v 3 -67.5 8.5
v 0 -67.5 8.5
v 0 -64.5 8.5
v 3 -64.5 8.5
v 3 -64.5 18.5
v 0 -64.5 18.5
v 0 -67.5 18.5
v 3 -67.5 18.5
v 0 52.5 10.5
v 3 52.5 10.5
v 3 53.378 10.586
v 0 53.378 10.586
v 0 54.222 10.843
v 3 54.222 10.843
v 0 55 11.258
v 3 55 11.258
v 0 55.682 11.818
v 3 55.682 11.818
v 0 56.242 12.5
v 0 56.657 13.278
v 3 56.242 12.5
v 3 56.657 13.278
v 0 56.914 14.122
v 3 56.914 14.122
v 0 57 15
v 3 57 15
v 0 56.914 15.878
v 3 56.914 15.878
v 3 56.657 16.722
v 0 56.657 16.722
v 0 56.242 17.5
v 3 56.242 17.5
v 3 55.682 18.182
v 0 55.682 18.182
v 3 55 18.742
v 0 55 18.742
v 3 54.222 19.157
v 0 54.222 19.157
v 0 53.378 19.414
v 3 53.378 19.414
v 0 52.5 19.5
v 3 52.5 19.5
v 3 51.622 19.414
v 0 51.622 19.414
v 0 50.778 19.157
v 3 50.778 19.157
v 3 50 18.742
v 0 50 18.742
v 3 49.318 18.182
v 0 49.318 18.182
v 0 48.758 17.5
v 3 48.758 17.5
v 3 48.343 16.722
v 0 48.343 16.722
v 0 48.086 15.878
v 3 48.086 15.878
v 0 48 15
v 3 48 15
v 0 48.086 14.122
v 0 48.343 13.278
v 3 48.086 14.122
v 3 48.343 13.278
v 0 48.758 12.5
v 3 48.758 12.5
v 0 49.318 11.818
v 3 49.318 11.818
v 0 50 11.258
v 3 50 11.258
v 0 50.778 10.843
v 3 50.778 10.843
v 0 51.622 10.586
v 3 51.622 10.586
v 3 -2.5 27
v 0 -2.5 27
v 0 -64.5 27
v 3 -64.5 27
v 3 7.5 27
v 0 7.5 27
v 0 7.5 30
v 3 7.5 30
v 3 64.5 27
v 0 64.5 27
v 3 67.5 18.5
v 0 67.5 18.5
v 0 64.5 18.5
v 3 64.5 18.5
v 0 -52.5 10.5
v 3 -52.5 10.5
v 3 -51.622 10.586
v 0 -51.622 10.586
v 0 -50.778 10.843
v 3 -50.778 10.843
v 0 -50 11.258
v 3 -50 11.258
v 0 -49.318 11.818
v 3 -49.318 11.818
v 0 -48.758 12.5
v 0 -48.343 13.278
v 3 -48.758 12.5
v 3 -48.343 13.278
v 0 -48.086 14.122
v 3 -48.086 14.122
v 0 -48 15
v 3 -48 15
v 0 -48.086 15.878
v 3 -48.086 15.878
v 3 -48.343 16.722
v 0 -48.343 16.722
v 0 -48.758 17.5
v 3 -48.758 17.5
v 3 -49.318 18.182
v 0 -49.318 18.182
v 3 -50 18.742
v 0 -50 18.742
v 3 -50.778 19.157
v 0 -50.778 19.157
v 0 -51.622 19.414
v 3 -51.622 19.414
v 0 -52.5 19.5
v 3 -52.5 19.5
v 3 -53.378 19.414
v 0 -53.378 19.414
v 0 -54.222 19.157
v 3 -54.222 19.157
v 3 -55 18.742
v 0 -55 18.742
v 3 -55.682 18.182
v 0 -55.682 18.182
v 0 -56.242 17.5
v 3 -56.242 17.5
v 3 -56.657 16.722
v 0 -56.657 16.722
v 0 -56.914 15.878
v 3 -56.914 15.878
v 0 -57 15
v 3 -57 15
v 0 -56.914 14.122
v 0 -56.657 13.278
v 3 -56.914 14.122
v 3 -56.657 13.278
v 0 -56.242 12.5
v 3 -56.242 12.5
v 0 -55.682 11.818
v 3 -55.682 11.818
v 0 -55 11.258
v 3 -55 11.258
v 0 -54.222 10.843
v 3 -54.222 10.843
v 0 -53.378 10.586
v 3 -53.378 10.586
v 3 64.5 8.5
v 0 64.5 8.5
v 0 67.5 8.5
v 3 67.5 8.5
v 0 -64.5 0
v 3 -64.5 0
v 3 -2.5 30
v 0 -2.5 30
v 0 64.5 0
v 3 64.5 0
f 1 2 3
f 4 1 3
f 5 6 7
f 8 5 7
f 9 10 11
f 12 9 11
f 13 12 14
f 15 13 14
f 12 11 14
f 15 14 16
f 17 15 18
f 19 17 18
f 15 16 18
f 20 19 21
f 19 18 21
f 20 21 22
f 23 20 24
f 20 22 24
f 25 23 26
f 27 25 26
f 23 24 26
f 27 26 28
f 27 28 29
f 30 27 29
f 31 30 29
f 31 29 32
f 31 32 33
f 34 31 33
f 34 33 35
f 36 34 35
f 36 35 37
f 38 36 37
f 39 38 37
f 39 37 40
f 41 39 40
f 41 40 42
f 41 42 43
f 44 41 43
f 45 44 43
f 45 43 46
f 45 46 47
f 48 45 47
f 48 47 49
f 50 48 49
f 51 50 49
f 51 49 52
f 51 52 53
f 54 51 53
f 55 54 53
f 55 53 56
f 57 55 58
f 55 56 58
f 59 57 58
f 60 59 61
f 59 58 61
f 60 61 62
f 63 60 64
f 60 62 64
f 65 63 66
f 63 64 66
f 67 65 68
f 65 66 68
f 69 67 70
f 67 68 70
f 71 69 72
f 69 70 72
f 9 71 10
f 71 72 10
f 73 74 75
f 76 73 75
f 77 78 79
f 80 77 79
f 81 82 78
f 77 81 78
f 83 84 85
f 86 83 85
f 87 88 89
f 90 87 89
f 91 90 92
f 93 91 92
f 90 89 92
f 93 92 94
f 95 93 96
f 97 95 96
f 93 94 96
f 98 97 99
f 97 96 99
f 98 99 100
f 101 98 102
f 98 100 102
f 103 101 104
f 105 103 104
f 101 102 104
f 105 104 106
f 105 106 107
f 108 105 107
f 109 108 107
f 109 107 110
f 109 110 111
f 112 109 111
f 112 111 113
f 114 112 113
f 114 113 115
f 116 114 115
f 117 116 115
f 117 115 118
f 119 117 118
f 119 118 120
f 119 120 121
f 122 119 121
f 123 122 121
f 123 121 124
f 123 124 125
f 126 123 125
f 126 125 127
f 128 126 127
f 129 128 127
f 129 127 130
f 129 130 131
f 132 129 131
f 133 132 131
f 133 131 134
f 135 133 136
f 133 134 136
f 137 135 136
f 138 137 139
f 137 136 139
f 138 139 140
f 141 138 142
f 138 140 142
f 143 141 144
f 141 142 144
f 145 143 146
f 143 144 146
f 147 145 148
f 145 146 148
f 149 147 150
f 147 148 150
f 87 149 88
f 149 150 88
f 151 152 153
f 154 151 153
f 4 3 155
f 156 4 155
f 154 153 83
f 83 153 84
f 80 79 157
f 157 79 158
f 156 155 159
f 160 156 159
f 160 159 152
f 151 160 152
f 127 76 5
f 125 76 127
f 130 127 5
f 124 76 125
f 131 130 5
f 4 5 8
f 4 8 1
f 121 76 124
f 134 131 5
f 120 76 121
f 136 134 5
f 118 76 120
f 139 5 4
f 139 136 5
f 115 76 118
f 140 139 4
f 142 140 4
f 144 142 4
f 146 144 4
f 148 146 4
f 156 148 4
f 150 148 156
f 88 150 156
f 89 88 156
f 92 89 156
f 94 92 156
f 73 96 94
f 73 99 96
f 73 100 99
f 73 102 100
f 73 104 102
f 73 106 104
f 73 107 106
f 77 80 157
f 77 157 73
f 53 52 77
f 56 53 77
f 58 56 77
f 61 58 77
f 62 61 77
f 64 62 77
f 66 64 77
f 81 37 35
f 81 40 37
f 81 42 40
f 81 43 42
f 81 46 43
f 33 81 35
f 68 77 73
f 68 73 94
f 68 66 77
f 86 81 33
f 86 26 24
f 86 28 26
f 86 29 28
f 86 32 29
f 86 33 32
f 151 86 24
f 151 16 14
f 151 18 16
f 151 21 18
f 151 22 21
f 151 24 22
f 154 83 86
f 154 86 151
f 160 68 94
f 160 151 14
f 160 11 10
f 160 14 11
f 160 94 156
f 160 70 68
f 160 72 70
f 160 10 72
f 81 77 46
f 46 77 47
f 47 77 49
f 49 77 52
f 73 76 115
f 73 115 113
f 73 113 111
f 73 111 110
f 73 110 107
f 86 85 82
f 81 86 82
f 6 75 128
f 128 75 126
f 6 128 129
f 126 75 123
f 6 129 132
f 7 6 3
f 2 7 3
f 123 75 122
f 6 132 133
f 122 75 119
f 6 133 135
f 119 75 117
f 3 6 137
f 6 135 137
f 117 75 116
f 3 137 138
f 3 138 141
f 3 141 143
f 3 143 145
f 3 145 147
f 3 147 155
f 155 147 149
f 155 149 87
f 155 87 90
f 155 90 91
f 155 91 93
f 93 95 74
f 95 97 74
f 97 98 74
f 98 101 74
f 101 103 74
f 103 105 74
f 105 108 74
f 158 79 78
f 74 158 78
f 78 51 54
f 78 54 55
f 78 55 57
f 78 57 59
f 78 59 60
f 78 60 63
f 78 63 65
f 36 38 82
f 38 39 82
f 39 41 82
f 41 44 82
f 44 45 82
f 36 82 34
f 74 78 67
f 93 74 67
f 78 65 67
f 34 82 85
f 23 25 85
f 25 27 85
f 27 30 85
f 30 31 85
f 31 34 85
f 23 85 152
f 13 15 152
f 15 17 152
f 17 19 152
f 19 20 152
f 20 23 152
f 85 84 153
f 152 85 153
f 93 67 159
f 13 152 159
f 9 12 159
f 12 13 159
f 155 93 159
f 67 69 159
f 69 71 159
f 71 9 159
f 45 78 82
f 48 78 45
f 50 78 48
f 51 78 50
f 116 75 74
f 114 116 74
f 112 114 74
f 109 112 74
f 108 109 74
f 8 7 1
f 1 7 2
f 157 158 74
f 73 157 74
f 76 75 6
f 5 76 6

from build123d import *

# Parameters (mm, degrees)
BOSS_EXTRUDE1_DEPTH = 3
SKETCH2_R           = 4.5
CUT_EXTRUDE1_DEPTH  = 74.927329182


with BuildPart() as part:
    # Sketch1 → Boss-Extrude1 (new body)
    with BuildSketch(Plane(origin=(0, 0, 0), x_dir=(0, 0, -1), z_dir=(1, 0, 0))):
        Polygon((0, 64.5), (-8.5, 64.5), (-8.5, 67.5), (-18.5, 67.5), (-18.5, 64.5), (-27, 64.5), (-27, 7.5), (-30, 7.5), (-30, -2.5), (-27, -2.5), (-27, -64.5), (-18.5, -64.5), (-18.5, -67.5), (-8.5, -67.5), (-8.5, -64.5), (0, -64.5), align=None)
    extrude(amount=BOSS_EXTRUDE1_DEPTH)

    # Sketch2 → Cut-Extrude1 (cut, through all)
    with BuildSketch(Plane(origin=(3, 0, 0), x_dir=(0, 0, -1), z_dir=(1, 0, 0))):
        with Locations((-15, 52.5)):
            Circle(SKETCH2_R)
        with Locations((-15, -52.5)):
            Circle(SKETCH2_R)
    extrude(amount=-CUT_EXTRUDE1_DEPTH, mode=Mode.SUBTRACT)


solid = part.part
